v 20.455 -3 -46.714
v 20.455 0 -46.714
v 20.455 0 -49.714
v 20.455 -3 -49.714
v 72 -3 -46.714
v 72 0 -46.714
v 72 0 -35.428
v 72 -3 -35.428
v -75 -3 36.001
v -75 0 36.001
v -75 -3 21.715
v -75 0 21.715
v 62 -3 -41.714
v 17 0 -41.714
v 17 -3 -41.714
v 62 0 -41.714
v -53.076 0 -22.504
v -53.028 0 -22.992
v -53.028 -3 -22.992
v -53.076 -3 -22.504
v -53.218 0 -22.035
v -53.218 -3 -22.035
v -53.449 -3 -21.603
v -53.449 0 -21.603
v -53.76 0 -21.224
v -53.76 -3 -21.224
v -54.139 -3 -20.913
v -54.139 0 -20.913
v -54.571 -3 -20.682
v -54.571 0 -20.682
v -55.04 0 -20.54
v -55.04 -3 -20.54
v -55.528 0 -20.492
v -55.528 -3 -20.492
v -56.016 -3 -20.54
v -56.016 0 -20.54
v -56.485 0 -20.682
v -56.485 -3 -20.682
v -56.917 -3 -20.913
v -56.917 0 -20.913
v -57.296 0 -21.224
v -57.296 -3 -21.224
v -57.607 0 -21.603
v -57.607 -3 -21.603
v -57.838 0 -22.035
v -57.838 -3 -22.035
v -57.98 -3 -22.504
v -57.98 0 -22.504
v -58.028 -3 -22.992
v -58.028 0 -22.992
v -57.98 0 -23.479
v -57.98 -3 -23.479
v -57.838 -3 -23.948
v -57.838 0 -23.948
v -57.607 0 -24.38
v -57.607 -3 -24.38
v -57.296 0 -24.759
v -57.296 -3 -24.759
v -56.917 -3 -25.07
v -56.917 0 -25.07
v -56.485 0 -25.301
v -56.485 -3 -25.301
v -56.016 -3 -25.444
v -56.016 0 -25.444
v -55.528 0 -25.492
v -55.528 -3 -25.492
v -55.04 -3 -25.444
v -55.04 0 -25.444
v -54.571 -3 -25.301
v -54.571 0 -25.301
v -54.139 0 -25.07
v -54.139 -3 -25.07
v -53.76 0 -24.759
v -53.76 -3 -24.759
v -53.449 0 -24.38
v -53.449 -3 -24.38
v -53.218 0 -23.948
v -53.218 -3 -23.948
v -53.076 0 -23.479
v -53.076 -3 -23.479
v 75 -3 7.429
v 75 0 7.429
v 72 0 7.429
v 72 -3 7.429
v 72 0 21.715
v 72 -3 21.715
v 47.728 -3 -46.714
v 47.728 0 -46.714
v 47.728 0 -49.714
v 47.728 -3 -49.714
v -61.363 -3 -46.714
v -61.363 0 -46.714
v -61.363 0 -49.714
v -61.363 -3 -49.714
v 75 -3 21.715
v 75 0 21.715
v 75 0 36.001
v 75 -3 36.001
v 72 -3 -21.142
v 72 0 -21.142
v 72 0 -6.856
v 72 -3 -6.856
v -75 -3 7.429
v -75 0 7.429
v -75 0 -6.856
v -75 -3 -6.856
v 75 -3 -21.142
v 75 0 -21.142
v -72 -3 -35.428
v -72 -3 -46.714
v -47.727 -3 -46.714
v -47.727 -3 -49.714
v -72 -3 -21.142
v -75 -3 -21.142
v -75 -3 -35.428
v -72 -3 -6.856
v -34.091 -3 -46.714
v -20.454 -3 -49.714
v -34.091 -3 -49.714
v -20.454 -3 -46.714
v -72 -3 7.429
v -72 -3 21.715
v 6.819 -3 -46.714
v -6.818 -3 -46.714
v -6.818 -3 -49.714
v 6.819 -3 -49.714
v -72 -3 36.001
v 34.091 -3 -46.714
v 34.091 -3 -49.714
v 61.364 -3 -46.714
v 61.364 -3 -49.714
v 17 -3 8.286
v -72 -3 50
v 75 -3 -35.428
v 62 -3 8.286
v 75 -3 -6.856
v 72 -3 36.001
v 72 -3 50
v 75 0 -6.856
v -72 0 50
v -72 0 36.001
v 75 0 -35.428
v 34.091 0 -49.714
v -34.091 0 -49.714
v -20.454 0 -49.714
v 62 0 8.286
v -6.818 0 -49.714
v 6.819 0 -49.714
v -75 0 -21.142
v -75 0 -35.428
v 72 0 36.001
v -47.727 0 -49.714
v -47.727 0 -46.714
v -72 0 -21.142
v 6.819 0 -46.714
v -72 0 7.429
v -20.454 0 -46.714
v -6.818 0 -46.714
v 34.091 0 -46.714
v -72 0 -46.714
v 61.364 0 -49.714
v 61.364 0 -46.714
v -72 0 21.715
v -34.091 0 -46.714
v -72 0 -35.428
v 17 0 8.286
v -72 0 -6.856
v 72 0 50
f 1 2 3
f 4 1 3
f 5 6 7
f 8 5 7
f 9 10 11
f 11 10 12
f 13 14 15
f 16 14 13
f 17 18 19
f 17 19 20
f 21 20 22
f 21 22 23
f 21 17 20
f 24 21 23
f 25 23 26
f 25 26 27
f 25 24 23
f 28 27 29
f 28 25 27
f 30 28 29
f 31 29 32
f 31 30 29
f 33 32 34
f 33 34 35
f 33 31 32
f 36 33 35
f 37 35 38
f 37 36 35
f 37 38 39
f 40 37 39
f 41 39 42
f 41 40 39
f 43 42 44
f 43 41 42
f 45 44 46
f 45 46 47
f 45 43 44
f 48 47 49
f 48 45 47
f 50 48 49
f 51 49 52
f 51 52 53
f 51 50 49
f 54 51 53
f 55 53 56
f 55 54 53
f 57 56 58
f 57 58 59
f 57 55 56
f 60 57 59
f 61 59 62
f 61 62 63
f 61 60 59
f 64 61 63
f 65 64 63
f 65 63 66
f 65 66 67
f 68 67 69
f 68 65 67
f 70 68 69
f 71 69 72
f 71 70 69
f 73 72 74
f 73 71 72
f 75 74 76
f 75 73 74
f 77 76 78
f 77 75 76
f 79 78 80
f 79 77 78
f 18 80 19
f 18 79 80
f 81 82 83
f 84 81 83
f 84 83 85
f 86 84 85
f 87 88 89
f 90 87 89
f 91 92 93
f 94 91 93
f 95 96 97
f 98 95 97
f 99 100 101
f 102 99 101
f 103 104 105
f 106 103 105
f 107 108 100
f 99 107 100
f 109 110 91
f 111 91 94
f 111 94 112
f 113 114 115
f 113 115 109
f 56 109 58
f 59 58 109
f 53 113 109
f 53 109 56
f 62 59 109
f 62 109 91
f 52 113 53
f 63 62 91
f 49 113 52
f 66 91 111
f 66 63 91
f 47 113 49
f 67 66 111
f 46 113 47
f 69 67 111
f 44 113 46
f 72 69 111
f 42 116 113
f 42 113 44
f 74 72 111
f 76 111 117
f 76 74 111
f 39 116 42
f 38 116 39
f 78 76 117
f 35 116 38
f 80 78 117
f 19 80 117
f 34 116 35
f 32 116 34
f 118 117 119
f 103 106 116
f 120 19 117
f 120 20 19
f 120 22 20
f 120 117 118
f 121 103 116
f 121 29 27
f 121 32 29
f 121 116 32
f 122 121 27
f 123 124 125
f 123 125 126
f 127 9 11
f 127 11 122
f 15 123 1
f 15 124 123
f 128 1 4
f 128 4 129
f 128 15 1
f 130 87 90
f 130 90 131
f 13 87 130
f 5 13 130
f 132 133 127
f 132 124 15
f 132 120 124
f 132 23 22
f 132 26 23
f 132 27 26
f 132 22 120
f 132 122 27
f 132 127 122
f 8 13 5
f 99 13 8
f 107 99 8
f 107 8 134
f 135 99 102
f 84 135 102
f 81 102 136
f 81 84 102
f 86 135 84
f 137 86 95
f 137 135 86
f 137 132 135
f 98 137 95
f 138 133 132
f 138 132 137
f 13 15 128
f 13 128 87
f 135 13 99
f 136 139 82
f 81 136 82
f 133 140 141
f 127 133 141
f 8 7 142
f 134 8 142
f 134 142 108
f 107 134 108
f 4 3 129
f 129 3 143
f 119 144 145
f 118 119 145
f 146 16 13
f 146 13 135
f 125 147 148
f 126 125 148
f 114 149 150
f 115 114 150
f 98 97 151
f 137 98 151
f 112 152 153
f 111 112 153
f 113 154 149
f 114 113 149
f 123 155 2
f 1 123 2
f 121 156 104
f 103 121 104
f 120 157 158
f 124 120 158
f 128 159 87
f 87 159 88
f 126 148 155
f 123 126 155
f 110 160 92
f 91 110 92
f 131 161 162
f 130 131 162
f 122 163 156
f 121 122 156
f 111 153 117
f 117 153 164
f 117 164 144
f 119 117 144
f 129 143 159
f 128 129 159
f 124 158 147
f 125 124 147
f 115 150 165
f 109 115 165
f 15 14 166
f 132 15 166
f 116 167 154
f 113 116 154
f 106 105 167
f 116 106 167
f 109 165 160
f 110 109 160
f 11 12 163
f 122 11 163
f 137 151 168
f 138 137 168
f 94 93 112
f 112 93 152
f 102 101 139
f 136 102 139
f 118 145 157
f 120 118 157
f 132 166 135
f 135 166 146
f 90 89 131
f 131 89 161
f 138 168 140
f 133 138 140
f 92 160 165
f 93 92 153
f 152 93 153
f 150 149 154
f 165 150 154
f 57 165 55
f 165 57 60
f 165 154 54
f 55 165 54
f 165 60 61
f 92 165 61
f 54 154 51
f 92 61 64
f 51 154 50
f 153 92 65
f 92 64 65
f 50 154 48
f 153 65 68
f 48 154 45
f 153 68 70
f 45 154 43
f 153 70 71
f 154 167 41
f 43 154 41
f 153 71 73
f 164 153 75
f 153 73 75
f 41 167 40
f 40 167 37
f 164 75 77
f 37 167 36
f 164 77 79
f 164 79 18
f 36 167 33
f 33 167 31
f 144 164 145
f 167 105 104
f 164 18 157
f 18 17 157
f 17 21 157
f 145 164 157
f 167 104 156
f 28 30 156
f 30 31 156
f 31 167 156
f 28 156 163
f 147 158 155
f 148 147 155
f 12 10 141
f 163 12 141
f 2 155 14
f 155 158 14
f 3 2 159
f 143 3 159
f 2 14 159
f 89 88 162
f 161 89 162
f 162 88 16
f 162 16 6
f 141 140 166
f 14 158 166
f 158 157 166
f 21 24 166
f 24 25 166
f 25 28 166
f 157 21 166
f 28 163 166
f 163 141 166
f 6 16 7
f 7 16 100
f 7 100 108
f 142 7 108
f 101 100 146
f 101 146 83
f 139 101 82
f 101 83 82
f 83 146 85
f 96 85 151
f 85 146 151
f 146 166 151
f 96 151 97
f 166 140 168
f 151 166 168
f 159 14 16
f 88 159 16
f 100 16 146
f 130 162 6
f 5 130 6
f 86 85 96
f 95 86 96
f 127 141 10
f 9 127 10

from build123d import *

# Parameters (mm, degrees)
F0_R     = 2.5
F0_W     = 45
F0_H     = 50
F1_DEPTH = 3


# Not quite as in the source:
# - ends of sketch curves that miss each other by under 0.0002 mm in the source are joined


with BuildPart() as f1:
    # F0 (on Front) → F1 (new body)
    with BuildSketch(Plane.XZ):
        Polygon((72.0000029802, 36.0006778365), (72.0000029802, 50), (-72.0000029802, 50), (-72.0000029802, 36.0006778365), (-75.0000029802, 36.0006778365), (-75.0000029802, 21.7149635505), (-72.0000029802, 21.7149635505), (-72.0000029802, 7.4292492645), (-75.0000029802, 7.4292492645), (-75.0000029802, -6.8564650215), (-72.0000029802, -6.8564650215), (-72.0000029802, -21.1421793075), (-75.0000029802, -21.1421793075), (-75.0000029802, -35.4278935935), (-72.0000029802, -35.4278935935), (-72.0000029802, -46.7136078775), (-61.363272724, -46.7136078775), (-61.363272724, -49.7136078775), (-47.726909088, -49.7136078775), (-47.726909088, -46.7136078775), (-34.090545452, -46.7136078775), (-34.090545452, -49.7136078775), (-20.454181816, -49.7136078775), (-20.454181816, -46.7136078775), (-6.81781818, -46.7136078775), (-6.81781818, -49.7136078775), (6.818545456, -49.7136078775), (6.818545456, -46.7136078775), (20.454909092, -46.7136078775), (20.454909092, -49.7136078775), (34.091272728, -49.7136078775), (34.091272728, -46.7136078775), (47.727636364, -46.7136078775), (47.727636364, -49.7136078775), (61.364, -49.7136078775), (61.364, -46.7136078775), (72.0000029802, -46.7136078775), (72.0000029802, -35.4278935935), (75.0000029802, -35.4278935935), (75.0000029802, -21.1421793075), (72.0000029802, -21.1421793075), (72.0000029802, -6.8564650215), (75.0000029802, -6.8564650215), (75.0000029802, 7.4292492645), (72.0000029802, 7.4292492645), (72.0000029802, 21.7149635505), (75.0000029802, 21.7149635505), (75.0000029802, 36.0006778365), align=None)
        with Locations((-55.5279403925, -22.991552949)):
            Circle(F0_R, mode=Mode.SUBTRACT)
        with Locations((39.5000029802, -16.7136078775)):
            Rectangle(F0_W, F0_H, mode=Mode.SUBTRACT)
    extrude(amount=F1_DEPTH)


solid = f1.part
